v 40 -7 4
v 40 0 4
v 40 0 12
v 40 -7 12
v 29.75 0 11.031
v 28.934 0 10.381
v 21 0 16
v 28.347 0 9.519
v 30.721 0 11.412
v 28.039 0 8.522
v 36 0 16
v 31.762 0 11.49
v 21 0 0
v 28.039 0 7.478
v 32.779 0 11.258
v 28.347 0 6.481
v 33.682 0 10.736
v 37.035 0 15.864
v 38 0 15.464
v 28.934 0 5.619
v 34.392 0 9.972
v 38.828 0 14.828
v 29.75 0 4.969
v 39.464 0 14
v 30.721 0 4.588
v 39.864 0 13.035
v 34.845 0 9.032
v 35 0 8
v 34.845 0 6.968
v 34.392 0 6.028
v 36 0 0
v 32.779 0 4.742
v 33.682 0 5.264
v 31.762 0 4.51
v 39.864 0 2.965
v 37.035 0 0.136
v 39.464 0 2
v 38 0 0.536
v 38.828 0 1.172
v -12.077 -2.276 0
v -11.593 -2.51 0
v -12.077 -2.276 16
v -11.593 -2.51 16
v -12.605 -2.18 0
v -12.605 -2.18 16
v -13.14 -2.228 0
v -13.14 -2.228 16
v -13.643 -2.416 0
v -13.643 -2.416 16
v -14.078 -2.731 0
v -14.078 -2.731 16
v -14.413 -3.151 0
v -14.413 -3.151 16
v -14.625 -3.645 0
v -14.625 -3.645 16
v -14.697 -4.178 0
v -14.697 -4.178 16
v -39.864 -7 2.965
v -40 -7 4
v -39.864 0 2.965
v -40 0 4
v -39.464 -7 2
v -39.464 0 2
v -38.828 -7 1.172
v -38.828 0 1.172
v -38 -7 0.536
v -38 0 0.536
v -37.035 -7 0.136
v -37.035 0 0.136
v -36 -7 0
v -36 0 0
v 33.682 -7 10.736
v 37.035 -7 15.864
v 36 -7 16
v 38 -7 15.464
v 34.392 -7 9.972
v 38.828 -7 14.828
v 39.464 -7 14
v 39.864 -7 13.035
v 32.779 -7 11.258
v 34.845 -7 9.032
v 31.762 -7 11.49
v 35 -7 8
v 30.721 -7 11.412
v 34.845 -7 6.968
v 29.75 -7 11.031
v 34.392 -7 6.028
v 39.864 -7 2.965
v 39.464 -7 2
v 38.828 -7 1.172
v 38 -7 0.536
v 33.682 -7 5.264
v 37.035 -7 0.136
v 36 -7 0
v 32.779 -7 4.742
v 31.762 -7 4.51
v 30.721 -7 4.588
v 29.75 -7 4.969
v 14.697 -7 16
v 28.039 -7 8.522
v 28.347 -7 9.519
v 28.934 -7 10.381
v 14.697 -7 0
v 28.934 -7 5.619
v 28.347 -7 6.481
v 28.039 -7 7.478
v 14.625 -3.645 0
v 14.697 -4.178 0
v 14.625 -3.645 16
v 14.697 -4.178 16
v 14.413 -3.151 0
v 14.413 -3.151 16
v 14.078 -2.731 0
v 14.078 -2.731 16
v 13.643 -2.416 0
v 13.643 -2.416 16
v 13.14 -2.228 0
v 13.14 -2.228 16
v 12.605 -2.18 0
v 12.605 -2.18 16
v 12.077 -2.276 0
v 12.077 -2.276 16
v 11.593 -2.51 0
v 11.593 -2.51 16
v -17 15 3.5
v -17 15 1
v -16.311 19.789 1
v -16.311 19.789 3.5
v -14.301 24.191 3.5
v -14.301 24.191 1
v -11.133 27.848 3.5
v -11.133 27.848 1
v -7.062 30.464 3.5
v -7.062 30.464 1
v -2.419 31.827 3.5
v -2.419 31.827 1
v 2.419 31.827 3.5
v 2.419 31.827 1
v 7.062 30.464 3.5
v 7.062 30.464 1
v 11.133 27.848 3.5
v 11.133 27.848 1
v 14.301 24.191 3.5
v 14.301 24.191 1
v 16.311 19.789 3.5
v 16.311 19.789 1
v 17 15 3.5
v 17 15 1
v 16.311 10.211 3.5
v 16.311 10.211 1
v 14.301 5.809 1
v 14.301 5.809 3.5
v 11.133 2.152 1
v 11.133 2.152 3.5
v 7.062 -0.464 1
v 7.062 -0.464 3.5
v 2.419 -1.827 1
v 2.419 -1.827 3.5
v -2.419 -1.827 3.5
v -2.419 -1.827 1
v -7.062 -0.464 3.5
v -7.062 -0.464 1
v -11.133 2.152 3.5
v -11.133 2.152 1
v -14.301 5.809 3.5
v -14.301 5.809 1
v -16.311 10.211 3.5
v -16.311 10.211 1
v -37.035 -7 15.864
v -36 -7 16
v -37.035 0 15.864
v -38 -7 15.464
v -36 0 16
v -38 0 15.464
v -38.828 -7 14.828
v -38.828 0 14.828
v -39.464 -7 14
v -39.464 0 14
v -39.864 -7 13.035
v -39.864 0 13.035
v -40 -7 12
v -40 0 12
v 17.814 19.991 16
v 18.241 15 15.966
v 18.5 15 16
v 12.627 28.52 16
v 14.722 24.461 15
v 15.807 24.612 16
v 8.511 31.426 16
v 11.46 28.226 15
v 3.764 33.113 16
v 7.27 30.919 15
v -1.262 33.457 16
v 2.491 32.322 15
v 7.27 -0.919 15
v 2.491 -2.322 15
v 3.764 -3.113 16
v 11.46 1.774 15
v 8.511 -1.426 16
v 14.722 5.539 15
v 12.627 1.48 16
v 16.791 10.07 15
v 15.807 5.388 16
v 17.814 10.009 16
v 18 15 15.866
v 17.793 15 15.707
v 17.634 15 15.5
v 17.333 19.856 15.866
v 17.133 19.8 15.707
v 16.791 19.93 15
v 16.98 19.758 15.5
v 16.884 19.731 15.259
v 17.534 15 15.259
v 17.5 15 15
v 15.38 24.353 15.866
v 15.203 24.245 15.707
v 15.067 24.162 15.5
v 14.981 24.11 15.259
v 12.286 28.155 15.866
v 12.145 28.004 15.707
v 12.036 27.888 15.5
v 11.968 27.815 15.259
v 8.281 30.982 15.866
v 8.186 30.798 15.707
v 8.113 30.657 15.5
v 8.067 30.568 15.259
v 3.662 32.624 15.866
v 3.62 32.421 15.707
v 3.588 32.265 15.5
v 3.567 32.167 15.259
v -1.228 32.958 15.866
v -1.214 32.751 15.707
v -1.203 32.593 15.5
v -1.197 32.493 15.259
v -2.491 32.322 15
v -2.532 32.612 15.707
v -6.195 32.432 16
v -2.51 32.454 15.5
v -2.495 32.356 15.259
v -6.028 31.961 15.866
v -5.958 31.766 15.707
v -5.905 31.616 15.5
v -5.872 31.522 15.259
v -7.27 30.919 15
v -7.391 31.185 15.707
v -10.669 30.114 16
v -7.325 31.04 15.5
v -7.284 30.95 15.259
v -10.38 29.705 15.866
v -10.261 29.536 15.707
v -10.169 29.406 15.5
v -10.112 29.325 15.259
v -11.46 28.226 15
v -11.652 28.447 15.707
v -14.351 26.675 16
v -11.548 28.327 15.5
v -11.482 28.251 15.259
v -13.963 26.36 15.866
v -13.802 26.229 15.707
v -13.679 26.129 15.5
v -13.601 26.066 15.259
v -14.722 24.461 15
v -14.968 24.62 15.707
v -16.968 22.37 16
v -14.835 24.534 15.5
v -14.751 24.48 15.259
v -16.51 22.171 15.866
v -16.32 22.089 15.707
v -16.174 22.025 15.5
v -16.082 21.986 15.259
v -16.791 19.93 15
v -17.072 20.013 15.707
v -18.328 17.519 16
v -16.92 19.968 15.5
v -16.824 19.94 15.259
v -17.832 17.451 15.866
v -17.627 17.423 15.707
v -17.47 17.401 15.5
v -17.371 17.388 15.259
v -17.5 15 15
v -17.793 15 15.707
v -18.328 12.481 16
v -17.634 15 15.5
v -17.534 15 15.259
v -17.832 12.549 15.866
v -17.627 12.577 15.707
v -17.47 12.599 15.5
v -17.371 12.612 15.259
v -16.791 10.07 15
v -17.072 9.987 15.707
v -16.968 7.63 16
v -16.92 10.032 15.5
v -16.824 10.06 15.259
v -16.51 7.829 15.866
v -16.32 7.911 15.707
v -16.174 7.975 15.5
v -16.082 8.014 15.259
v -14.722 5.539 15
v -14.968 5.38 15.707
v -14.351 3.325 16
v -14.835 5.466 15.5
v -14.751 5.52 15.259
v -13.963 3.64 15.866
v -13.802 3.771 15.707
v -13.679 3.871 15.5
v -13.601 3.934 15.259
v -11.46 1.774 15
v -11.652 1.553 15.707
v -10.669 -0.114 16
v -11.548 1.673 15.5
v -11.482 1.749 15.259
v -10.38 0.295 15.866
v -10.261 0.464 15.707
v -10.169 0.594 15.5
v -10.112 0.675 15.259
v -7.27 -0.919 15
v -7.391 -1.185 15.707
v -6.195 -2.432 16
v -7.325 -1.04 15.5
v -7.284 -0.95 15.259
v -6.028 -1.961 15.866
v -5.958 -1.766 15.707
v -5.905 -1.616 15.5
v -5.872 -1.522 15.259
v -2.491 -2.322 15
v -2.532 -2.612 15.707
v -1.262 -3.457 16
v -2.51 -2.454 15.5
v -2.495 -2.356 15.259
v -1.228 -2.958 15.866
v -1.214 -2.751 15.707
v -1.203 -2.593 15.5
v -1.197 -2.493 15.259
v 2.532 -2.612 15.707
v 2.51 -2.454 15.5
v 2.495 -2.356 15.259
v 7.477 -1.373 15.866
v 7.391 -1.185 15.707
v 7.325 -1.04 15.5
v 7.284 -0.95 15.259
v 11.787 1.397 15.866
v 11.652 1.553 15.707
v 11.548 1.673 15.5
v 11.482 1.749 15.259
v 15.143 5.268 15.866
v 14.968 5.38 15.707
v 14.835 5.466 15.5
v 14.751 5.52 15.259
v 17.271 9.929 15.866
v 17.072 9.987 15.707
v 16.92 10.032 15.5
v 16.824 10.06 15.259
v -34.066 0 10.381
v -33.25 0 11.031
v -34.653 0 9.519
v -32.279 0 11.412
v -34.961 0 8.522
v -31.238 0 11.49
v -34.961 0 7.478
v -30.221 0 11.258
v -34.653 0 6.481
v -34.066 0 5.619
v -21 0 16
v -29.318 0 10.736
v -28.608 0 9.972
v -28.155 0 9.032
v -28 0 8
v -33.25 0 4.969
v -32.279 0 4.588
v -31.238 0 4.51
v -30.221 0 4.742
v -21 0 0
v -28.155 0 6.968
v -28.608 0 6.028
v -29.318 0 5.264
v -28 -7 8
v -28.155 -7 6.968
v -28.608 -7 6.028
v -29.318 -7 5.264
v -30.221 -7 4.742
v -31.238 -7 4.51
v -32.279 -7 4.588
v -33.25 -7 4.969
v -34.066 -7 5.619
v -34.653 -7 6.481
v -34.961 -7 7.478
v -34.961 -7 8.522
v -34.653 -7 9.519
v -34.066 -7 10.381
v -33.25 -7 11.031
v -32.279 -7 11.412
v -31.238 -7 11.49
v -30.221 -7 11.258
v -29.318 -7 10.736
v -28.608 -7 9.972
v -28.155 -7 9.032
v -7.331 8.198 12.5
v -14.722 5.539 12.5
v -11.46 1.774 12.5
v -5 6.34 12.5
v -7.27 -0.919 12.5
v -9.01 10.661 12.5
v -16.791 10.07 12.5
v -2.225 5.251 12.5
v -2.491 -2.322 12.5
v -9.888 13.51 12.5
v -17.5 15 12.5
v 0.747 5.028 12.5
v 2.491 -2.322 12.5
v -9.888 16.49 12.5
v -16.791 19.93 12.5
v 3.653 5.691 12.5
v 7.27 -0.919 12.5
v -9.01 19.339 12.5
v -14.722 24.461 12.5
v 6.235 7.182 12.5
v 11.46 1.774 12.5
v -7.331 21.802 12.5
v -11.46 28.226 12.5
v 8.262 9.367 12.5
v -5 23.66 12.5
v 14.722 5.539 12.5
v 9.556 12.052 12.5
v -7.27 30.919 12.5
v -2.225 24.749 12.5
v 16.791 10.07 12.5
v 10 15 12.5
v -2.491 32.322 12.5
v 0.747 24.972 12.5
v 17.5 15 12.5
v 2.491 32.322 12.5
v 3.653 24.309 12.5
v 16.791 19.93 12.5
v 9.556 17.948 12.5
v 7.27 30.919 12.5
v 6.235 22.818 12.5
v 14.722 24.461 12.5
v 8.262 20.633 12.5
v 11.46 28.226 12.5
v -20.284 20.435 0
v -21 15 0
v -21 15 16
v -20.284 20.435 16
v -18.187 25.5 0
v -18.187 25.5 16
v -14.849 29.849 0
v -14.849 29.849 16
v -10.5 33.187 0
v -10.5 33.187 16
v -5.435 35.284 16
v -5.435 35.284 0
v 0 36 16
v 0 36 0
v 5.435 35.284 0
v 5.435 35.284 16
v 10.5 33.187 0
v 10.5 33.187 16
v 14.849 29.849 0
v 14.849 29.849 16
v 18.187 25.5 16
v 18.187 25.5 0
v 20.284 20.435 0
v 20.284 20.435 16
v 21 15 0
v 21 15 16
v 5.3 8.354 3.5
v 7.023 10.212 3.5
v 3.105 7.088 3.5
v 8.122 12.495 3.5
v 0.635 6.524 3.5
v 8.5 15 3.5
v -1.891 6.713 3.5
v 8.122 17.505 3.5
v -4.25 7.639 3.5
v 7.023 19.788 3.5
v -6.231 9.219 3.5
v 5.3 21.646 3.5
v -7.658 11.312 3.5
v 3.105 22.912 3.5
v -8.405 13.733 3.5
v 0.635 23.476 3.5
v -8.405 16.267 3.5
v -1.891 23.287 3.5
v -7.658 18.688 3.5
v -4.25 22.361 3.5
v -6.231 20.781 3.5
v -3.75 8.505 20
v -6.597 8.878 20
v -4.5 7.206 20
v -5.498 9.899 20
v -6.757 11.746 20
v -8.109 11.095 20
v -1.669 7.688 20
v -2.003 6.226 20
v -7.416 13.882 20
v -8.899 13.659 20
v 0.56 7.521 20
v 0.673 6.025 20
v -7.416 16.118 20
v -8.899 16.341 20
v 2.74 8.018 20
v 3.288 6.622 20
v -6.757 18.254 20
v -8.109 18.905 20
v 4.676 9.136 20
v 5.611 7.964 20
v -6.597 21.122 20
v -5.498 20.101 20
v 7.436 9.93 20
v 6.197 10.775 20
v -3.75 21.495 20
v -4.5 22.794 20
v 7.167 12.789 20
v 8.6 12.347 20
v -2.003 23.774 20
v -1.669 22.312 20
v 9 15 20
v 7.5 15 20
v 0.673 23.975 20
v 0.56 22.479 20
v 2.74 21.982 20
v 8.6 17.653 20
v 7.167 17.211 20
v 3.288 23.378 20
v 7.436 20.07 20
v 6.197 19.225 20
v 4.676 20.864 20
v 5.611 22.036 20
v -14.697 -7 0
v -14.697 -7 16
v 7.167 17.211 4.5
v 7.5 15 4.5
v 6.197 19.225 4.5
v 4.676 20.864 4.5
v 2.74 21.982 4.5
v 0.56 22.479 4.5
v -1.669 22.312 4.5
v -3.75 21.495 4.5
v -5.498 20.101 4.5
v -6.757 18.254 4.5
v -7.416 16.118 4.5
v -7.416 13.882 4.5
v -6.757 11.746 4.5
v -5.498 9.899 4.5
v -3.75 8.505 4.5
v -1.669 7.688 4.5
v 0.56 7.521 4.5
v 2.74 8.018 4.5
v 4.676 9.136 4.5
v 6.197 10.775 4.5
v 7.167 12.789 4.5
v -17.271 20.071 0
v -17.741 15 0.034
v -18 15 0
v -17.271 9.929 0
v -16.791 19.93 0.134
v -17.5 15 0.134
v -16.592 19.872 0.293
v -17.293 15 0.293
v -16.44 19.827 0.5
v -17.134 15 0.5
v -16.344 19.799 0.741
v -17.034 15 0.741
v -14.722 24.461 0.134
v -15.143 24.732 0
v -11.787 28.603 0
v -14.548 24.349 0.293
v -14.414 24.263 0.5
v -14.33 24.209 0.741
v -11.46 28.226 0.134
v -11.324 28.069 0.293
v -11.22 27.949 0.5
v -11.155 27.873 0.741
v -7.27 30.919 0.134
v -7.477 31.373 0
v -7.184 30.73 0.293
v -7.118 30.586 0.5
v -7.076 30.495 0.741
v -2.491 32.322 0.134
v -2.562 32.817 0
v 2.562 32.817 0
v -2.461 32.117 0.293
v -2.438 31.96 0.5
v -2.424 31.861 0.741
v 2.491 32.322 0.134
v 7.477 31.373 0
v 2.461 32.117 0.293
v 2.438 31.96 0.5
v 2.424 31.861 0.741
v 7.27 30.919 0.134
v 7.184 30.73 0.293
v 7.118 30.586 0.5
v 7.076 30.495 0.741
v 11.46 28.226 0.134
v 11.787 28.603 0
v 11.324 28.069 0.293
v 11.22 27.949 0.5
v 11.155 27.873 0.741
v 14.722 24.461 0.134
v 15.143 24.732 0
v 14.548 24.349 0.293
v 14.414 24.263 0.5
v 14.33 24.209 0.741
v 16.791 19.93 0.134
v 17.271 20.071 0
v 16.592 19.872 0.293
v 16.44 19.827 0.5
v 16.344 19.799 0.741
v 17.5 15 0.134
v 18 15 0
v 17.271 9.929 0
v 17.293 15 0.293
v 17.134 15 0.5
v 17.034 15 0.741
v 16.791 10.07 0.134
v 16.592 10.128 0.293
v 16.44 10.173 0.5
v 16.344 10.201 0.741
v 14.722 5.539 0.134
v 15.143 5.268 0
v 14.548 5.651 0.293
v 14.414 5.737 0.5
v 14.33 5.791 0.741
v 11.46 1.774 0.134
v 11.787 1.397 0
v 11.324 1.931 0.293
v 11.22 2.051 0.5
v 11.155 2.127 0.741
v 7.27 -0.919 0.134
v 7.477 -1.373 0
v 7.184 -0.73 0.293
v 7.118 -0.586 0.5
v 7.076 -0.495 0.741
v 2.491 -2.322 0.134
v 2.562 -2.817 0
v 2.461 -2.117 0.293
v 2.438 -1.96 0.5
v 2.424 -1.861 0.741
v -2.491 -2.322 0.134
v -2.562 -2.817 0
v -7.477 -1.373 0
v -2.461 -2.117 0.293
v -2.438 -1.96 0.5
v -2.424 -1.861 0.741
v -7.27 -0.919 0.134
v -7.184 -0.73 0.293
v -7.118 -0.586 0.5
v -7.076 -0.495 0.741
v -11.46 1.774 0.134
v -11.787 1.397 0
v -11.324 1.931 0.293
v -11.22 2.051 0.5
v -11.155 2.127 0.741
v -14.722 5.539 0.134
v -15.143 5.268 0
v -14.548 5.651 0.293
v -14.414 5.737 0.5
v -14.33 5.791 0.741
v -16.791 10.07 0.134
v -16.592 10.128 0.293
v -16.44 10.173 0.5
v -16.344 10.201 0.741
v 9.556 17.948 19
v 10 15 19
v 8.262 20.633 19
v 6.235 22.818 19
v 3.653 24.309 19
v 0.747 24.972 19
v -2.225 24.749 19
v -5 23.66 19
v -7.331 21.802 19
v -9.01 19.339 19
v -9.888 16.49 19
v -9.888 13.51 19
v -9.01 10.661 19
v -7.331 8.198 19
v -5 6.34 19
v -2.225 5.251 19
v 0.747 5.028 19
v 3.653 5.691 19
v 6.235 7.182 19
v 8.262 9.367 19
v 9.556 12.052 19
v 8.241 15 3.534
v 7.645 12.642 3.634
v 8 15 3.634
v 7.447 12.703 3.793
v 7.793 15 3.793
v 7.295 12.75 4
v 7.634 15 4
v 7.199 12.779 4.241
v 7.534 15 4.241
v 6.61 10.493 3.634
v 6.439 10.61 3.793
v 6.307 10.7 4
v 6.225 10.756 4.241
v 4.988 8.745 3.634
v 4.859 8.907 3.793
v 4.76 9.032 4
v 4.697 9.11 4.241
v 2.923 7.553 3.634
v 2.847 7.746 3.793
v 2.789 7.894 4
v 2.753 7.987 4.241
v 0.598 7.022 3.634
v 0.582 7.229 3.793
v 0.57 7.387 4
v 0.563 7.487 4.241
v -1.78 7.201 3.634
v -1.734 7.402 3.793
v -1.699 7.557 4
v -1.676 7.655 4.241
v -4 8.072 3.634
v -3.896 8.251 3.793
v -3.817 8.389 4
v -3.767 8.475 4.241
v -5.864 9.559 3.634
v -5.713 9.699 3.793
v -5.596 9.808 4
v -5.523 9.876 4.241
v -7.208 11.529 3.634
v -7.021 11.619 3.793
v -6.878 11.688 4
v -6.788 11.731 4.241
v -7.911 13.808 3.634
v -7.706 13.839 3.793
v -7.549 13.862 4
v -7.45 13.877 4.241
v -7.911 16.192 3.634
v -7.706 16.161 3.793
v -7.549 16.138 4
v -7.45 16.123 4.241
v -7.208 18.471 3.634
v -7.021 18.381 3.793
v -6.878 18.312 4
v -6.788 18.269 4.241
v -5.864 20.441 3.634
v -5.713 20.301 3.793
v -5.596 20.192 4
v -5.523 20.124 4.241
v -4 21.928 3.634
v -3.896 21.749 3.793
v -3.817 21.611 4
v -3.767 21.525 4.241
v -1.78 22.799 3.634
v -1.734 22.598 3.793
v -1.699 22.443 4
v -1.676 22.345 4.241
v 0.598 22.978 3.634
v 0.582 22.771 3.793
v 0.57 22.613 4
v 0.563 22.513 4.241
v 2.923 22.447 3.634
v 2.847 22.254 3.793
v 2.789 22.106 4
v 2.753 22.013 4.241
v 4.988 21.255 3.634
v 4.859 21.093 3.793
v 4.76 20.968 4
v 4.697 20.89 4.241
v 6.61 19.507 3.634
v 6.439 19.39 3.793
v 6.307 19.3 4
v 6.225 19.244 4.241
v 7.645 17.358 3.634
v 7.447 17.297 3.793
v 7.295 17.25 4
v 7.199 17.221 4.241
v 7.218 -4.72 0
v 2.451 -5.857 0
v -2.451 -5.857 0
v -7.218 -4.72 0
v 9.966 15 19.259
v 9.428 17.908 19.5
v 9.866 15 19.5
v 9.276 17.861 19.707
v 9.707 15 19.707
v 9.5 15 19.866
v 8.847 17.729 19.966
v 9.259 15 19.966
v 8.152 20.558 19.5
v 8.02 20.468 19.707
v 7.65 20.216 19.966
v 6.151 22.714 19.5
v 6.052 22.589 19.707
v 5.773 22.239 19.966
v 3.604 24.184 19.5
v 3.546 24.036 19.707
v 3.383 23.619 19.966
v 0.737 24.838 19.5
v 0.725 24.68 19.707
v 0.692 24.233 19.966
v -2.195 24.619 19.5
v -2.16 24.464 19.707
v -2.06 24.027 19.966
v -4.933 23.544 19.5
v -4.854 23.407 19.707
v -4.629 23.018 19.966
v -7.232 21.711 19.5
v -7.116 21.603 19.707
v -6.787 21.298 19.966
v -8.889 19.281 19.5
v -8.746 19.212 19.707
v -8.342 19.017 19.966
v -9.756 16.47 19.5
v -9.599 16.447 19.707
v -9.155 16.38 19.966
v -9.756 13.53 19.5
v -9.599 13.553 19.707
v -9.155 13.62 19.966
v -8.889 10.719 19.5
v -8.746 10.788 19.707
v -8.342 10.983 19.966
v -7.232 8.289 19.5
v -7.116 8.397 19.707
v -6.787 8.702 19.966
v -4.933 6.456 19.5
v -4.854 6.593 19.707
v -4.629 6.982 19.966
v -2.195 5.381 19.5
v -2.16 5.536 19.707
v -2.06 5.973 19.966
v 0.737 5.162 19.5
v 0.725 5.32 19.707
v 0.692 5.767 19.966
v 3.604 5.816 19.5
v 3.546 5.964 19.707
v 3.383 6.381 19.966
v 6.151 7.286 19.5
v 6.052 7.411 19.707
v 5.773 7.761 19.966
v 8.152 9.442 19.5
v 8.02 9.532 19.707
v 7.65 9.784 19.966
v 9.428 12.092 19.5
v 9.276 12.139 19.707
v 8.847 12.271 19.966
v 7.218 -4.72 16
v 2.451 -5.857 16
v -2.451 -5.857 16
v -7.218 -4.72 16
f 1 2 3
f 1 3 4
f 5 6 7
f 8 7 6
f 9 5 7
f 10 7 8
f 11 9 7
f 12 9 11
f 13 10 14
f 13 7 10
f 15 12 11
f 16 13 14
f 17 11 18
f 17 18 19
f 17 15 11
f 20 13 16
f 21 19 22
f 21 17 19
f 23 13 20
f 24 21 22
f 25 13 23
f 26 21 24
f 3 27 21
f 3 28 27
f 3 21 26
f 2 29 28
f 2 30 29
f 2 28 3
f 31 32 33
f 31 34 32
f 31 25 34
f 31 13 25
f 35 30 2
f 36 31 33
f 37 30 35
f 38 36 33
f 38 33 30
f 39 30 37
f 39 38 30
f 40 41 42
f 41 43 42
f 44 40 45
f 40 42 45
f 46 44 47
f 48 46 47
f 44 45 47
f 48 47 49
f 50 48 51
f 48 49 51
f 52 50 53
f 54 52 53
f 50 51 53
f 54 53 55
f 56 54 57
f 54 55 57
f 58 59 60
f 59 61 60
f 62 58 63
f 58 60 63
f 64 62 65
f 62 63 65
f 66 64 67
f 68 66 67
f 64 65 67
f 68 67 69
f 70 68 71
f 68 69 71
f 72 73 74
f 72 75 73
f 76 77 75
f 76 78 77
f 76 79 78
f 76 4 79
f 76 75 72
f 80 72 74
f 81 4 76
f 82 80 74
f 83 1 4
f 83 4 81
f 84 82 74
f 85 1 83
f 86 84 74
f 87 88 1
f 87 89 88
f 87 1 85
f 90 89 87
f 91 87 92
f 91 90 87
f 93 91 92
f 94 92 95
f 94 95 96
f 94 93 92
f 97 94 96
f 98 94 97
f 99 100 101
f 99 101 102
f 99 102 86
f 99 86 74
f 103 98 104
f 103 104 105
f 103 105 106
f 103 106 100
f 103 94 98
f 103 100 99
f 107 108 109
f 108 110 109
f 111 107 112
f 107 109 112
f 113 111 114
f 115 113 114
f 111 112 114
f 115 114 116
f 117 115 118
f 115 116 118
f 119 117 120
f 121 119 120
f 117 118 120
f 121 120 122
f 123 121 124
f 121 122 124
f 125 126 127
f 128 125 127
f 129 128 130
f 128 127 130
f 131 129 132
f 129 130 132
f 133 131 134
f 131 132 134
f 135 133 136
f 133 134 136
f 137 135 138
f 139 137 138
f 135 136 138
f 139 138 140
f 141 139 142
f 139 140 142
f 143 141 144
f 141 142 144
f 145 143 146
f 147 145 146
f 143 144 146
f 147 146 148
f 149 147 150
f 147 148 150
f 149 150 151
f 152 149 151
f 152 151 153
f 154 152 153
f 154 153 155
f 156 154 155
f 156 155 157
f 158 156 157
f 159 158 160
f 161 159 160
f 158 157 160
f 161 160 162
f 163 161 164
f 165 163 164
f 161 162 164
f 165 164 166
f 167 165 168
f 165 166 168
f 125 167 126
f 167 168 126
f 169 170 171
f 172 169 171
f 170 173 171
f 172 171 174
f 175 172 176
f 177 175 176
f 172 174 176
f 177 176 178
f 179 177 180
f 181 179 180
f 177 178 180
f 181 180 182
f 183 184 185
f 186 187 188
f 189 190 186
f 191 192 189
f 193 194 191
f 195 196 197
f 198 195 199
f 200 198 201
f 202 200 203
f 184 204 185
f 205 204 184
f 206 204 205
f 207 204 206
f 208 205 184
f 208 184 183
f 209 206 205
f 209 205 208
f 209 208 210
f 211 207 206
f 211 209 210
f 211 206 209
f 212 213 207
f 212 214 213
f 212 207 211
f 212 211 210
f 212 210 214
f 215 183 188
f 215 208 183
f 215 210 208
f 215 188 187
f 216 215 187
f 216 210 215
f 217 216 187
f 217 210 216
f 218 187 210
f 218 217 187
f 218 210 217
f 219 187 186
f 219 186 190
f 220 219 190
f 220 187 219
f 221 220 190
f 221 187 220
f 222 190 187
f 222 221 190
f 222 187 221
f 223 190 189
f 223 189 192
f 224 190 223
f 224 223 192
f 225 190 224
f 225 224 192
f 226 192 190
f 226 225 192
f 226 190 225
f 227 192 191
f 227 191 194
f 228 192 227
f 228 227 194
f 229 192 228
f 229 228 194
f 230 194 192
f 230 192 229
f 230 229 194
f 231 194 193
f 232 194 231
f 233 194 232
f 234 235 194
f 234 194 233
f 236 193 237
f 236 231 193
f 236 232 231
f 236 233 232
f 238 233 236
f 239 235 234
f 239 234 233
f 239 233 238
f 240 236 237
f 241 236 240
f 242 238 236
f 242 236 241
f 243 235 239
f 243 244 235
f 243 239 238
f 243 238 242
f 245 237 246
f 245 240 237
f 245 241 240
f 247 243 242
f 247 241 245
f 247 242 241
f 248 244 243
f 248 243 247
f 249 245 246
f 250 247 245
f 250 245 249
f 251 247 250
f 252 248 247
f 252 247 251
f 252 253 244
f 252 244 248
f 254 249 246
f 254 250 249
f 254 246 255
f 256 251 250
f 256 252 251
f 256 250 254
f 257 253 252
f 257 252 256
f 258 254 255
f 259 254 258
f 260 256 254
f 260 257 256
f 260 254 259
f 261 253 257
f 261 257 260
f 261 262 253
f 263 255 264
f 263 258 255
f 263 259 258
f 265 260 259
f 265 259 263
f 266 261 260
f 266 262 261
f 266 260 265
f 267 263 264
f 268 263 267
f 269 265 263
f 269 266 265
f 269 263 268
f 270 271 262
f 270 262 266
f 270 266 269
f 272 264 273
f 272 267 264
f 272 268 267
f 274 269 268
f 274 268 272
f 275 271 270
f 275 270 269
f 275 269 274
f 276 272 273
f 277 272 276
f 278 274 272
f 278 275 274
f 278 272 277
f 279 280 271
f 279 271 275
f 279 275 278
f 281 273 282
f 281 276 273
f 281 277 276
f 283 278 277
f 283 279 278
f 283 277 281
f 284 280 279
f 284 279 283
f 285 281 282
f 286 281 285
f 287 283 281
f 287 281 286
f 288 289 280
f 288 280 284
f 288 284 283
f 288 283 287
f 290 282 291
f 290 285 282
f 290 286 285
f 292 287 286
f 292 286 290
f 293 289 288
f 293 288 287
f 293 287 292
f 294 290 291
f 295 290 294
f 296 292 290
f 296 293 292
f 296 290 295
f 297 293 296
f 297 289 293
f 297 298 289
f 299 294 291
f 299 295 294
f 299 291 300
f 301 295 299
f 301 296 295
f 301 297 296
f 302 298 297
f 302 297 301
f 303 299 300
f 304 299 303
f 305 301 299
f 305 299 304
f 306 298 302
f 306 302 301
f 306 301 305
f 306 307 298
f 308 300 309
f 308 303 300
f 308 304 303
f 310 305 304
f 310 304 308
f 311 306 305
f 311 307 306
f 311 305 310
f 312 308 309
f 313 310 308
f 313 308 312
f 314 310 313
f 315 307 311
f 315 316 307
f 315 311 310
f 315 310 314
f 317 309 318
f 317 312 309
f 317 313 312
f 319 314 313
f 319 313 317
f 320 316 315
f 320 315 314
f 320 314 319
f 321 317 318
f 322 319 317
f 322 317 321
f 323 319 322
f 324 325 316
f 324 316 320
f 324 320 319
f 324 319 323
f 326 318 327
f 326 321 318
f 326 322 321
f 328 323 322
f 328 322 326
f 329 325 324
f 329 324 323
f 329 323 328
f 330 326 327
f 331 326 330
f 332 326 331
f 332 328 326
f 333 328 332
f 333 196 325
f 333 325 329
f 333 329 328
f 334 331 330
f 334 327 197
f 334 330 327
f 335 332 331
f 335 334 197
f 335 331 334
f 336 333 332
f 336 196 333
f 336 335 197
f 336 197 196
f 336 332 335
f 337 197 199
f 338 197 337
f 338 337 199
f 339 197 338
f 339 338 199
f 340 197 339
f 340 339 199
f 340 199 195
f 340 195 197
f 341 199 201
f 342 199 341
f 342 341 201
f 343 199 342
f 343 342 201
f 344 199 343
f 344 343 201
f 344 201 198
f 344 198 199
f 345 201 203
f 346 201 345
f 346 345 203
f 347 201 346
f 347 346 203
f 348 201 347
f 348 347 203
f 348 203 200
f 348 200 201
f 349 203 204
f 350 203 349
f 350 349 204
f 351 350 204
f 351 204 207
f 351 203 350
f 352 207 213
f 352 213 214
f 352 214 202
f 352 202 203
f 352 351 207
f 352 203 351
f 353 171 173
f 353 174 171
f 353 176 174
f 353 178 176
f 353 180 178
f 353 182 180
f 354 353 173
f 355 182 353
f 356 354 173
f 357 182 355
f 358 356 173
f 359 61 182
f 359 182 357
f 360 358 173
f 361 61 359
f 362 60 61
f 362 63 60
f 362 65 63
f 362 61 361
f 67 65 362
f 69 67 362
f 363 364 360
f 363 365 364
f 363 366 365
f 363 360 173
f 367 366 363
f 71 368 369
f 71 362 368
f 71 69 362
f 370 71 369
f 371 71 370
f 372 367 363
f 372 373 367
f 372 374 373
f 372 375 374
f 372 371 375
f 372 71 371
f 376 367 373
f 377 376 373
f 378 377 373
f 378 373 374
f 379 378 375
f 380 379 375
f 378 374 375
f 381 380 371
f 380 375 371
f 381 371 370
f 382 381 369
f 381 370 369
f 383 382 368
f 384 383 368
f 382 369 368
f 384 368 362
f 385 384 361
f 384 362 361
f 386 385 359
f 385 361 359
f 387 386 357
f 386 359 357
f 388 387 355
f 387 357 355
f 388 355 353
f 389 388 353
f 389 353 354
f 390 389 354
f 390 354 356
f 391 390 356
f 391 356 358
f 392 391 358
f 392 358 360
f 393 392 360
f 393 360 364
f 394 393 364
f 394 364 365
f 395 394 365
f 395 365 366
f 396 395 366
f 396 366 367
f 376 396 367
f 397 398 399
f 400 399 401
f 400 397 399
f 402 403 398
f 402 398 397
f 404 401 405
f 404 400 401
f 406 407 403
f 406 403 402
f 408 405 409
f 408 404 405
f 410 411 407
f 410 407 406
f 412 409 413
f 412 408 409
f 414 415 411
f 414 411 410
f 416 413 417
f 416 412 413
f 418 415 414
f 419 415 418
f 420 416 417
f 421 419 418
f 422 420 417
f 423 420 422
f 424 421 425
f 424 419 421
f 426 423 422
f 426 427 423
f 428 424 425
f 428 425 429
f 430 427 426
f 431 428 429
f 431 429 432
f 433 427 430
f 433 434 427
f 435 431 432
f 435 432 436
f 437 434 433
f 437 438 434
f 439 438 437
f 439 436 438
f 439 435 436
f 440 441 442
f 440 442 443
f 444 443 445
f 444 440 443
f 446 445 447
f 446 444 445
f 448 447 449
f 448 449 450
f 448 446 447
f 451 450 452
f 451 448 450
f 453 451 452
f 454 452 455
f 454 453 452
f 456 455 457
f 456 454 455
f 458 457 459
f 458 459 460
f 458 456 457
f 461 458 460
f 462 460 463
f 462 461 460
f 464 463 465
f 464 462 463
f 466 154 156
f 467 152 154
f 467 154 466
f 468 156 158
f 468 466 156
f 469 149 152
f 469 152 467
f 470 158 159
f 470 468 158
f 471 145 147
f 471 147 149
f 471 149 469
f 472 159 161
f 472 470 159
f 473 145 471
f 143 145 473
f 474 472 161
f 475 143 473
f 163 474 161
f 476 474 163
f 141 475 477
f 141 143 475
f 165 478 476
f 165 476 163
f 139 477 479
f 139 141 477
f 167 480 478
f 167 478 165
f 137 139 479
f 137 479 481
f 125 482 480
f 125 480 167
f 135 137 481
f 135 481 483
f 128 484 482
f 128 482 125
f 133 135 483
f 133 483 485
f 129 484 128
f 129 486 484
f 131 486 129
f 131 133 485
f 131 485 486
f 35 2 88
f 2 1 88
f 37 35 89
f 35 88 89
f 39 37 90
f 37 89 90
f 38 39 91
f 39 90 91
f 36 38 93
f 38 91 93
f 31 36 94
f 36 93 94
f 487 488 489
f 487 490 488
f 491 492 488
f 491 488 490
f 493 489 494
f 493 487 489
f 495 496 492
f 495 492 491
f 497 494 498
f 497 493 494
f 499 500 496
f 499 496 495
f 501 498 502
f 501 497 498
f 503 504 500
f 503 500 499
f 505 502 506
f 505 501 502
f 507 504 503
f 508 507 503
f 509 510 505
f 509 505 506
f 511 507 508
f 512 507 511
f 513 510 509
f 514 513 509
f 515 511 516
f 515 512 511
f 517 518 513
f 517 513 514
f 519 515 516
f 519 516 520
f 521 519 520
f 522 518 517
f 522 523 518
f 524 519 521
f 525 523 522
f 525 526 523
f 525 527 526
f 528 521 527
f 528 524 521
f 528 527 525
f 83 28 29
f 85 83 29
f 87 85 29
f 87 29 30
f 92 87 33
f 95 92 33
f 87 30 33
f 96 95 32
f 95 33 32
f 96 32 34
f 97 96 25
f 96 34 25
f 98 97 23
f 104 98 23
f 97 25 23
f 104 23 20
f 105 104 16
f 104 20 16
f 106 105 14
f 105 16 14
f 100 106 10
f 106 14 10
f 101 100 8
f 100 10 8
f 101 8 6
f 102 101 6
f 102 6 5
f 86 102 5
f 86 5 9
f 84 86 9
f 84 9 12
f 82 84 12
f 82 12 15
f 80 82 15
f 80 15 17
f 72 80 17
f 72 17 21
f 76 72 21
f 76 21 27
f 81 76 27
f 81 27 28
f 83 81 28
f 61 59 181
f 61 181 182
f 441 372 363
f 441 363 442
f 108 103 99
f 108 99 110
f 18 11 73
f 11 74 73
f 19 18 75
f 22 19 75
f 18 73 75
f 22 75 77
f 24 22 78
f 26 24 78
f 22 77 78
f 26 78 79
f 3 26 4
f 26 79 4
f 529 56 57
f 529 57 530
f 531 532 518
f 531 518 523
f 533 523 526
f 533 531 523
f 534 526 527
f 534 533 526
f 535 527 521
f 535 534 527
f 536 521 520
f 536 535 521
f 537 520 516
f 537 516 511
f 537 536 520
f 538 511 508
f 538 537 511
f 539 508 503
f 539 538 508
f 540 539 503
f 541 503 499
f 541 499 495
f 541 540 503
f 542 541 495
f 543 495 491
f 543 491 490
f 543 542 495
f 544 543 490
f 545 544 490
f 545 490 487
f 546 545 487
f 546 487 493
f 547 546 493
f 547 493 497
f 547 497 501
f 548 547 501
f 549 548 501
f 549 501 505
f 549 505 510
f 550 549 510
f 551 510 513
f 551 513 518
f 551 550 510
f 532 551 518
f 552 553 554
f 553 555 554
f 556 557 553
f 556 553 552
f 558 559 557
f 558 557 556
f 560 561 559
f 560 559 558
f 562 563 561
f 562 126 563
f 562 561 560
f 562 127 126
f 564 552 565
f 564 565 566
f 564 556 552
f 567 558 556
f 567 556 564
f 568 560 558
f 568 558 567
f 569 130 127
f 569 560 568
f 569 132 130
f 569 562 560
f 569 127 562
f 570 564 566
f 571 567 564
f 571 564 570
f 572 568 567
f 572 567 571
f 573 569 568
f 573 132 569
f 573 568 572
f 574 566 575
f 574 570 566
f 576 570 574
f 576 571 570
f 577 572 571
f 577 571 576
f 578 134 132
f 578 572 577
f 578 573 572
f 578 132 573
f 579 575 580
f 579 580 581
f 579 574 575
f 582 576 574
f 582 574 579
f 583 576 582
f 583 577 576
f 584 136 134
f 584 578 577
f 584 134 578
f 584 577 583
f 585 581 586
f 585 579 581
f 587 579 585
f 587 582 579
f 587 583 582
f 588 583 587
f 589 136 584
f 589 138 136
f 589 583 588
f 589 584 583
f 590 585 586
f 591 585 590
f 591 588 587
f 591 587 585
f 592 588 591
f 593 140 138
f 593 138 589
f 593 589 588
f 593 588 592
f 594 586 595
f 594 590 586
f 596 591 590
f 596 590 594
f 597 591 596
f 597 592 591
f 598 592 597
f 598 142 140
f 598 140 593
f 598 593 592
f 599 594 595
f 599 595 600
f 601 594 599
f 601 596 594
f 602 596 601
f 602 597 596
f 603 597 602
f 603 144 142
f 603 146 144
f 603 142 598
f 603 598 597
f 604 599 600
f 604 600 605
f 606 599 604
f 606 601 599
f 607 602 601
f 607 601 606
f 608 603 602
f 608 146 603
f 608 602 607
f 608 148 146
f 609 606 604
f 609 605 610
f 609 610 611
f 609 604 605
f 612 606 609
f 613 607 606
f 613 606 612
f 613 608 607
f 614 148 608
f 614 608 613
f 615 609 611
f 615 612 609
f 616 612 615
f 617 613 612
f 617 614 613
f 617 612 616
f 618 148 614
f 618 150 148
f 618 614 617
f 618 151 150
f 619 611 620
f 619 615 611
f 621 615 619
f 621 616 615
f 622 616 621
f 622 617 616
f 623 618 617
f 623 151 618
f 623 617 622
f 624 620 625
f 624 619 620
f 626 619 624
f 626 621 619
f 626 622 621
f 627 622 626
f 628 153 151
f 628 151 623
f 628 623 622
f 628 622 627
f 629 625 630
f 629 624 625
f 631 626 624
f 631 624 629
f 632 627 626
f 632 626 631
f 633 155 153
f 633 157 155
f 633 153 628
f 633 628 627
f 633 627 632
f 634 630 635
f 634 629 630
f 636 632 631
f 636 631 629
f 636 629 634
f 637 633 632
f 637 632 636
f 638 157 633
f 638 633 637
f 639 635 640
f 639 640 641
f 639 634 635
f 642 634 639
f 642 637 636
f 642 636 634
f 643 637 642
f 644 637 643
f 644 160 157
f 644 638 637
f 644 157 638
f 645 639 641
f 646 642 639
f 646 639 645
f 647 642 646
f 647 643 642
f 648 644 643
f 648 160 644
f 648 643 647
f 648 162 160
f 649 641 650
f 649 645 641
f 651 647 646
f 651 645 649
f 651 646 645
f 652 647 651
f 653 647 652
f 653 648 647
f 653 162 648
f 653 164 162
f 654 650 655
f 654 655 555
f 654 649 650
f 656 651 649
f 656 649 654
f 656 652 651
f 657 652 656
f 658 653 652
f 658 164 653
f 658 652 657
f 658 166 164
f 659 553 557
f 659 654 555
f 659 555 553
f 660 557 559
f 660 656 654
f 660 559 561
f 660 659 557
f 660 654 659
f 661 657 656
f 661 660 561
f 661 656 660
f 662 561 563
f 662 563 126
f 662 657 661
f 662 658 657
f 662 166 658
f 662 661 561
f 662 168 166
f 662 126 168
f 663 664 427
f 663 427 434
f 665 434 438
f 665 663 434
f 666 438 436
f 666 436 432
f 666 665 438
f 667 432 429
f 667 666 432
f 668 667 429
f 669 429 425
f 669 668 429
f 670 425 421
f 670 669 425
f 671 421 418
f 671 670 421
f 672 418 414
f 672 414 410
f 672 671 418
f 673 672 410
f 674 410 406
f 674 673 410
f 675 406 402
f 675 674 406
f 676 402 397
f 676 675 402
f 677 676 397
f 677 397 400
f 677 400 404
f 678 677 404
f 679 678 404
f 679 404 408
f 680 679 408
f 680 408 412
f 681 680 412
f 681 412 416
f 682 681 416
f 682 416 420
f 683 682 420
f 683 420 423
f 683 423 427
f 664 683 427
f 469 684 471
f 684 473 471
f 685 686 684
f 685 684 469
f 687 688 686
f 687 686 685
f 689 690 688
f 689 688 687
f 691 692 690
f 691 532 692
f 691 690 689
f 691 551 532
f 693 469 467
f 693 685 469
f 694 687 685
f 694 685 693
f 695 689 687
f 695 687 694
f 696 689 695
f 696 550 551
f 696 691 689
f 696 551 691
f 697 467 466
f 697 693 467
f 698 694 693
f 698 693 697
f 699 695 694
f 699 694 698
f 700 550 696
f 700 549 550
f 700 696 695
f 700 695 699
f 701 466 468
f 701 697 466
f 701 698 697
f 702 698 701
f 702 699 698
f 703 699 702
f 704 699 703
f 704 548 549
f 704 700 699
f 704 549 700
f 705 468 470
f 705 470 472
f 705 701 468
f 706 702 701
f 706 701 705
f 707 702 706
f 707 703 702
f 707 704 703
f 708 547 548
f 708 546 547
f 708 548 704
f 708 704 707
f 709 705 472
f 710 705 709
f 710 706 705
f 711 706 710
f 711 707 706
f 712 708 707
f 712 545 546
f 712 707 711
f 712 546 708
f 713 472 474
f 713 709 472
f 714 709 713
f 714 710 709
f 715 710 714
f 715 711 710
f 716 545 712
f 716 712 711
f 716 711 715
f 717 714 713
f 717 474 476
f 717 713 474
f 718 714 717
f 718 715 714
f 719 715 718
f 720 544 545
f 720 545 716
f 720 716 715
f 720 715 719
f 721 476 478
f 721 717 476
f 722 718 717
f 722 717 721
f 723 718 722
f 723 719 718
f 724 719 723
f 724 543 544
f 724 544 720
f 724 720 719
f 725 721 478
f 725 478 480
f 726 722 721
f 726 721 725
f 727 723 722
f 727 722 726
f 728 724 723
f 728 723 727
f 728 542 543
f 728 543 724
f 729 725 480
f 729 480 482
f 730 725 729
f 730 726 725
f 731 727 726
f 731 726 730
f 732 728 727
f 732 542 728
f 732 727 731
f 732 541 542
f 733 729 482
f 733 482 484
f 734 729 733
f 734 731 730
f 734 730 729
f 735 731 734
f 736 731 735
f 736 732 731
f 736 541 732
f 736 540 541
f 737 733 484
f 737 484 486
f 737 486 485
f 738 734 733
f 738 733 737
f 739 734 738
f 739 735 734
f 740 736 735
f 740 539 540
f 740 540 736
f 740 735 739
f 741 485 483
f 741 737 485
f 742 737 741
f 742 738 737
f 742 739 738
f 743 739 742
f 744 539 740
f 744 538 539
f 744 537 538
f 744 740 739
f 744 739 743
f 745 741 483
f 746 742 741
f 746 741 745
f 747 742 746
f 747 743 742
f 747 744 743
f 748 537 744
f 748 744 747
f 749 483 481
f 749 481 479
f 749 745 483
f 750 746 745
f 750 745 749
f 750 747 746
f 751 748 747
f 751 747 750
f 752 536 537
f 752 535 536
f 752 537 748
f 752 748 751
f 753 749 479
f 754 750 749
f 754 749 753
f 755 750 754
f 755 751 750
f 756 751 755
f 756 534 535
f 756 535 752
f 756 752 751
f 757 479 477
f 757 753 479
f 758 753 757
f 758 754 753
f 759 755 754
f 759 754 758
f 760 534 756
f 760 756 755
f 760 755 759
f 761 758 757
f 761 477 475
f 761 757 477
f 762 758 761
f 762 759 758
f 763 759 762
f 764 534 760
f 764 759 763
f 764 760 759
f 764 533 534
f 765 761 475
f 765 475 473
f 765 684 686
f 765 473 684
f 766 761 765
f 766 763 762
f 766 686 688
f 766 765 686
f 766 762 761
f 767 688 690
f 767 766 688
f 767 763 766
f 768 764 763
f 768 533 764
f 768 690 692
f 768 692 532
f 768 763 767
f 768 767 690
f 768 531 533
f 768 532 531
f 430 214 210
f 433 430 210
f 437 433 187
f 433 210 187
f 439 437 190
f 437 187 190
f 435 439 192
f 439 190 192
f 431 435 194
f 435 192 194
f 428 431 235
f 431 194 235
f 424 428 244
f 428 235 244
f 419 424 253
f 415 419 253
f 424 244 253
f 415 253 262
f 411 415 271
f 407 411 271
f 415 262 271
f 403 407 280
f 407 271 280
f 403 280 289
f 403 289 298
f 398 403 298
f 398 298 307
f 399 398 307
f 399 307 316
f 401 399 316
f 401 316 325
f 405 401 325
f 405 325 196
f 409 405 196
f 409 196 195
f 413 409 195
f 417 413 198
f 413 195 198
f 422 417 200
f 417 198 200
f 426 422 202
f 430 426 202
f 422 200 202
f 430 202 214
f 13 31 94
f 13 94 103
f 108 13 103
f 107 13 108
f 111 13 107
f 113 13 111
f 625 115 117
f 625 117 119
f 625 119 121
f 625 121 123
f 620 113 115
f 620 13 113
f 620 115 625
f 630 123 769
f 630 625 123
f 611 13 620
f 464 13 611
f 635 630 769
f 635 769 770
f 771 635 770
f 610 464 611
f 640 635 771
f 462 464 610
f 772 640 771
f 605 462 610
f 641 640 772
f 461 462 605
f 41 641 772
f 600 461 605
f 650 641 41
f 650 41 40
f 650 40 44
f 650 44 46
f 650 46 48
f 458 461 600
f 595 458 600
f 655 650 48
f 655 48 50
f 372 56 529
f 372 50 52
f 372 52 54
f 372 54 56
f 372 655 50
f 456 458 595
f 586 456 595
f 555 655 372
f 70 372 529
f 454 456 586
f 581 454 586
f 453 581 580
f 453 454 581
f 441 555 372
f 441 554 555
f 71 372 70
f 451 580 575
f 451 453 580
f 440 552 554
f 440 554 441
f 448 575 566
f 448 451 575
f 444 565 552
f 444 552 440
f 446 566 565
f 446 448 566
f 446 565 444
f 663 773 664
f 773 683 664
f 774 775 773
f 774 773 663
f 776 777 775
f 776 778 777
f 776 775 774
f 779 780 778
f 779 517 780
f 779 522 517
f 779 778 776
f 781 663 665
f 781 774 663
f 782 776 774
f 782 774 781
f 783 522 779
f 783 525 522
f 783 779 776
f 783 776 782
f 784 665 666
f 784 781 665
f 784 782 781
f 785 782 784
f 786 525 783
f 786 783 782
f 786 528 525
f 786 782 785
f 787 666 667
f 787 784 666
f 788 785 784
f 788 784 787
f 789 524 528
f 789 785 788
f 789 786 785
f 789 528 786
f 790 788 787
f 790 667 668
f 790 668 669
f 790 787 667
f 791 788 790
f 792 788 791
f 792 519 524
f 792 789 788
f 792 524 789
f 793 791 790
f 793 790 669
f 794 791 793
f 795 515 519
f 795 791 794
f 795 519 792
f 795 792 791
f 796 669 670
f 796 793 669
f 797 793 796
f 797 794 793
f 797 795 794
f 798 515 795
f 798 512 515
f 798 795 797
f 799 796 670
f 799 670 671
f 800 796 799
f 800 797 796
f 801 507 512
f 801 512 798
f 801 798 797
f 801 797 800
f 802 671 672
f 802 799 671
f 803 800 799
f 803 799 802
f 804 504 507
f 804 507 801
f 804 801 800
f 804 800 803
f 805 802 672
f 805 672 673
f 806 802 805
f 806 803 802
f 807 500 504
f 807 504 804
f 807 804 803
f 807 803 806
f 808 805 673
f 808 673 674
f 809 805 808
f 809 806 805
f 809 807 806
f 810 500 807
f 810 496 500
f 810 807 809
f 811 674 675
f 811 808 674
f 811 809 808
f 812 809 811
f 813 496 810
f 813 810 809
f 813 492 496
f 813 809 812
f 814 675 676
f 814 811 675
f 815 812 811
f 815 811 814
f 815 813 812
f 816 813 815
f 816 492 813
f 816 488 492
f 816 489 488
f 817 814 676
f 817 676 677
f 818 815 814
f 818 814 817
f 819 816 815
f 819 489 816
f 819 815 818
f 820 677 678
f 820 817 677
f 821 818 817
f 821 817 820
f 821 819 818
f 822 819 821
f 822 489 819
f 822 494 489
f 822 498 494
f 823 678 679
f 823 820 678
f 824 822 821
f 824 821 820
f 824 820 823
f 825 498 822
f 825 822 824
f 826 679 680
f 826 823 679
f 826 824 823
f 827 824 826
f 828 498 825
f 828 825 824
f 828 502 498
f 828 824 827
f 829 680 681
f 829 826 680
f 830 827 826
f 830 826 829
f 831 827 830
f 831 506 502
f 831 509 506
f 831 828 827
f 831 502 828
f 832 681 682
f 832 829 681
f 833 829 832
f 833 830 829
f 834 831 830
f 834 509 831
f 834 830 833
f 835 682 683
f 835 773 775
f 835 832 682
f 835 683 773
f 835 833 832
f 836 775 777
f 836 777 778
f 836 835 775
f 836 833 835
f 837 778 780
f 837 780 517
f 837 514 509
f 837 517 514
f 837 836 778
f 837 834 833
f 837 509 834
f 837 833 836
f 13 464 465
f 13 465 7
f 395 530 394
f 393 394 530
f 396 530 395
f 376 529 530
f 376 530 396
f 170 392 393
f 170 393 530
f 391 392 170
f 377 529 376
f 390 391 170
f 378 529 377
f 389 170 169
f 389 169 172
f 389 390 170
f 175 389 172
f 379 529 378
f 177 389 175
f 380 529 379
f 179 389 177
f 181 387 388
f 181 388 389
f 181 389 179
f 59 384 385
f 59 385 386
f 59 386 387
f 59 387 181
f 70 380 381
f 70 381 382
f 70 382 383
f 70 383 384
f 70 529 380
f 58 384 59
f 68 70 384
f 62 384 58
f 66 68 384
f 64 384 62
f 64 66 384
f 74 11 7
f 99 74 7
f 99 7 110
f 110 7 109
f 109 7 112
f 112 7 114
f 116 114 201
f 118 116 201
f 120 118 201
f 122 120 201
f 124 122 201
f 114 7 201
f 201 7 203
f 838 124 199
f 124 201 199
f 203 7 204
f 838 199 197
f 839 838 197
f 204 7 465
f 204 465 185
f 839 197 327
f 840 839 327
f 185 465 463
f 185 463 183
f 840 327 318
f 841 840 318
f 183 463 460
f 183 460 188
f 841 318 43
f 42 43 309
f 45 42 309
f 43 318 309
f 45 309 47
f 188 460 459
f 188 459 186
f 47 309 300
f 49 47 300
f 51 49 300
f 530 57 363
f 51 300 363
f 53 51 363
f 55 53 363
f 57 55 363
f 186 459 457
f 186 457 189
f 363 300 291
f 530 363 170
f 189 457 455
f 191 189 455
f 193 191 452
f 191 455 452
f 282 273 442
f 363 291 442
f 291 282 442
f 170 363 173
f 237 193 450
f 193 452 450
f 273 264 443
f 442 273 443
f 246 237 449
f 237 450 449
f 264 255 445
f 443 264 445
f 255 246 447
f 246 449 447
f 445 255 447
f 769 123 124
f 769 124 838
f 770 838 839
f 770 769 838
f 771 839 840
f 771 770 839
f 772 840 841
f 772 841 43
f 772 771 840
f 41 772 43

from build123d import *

# Parameters (mm, degrees)
SKETCH_1_R               = 7.5
EXTRUDE_1_DEPTH          = 16
SKETCH_2_R               = 10
SKETCH_2_R_2             = 7.5
EXTRUDE_2_DEPTH          = 4
SKETCH_3_R               = 17.5
SKETCH_3_R_2             = 10
CUT_EXTRUDE_1_DEPTH      = 3.5
SKETCH_4_R               = 17
CUT_EXTRUDE_2_DEPTH      = 3.5
FILLET_1_R               = 4
FILLET_2_R               = 2
FILLET_3_R               = 1
SKETCH_5_R               = 3.5
CUT_EXTRUDE_3_DEPTH      = 37
CUT_EXTRUDE_3_DEPTH_BACK = 8


with BuildPart() as part:
    # 草图1 → 凸台-拉伸1 (new body)
    with BuildSketch(Plane.XY):
        with BuildLine():
            Line((-40, 0), (-21, 0))
            Line((-21, 0), (-21, 15))
            ThreePointArc((-21, 15), (0, 36), (21, 15))
            Line((21, 15), (21, 0))
            Line((21, 0), (40, 0))
            Line((40, 0), (40, -7))
            Line((40, -7), (14.696938457, -7))
            Line((14.696938457, -7), (14.696938457, 0))
            ThreePointArc((14.696938457, 0), (0, -6), (-14.696938457, 0))
            Line((-14.696938457, 0), (-14.696938457, -7))
            Line((-14.696938457, -7), (-40, -7))
            Line((-40, -7), (-40, 0))
        make_face()
        with Locations((0, 15)):
            Circle(SKETCH_1_R, mode=Mode.SUBTRACT)
    extrude(amount=EXTRUDE_1_DEPTH)

    # 草图2 → 凸台-拉伸2 (add)
    with BuildSketch(Plane.XY.offset(16)):
        with Locations((0, 15)):
            Circle(SKETCH_2_R)
        with Locations((0, 15)):
            Circle(SKETCH_2_R_2, mode=Mode.SUBTRACT)
    extrude(amount=EXTRUDE_2_DEPTH)

    # 草图3 → 切除-拉伸1 (cut)
    with BuildSketch(Plane.XY.offset(16)):
        with Locations((0, 15)):
            Circle(SKETCH_3_R)
        with Locations((0, 15)):
            Circle(SKETCH_3_R_2, mode=Mode.SUBTRACT)
    extrude(amount=-CUT_EXTRUDE_1_DEPTH, mode=Mode.SUBTRACT)

    # 草图4 → 切除-拉伸2 (cut)
    with BuildSketch(Plane(origin=(0, 0, 0), x_dir=(-1, 0, 0), z_dir=(0, 0, -1))):
        with Locations((0, 15)):
            Circle(SKETCH_4_R)
    extrude(amount=-CUT_EXTRUDE_2_DEPTH, mode=Mode.SUBTRACT)

    # 圆角1
    fillet_1_edges = [part.edges().sort_by_distance(p)[0] for p in [
        (40, -3.5, 0),
        (-40, -3.5, 0),
        (40, -3.5, 16),
        (-40, -3.5, 16),
    ]]
    fillet(fillet_1_edges, radius=FILLET_1_R)

    # 圆角2
    fillet_2_edges = [part.edges().sort_by_distance(p)[0] for p in [
        (14.696938457, 0, 8),
        (-14.696938457, 0, 8),
    ]]
    fillet(fillet_2_edges, radius=FILLET_2_R)

    # 圆角3
    fillet_3_edges = [part.edges().sort_by_distance(p)[0] for p in [
        (-10, 15, 20),
        (-17.5, 15, 16),
        (-7.5, 15, 3.5),
        (17, 15, 0),
    ]]
    fillet(fillet_3_edges, radius=FILLET_3_R)

    # 草图5 → 切除-拉伸3 (cut, two sides)
    with BuildSketch(Plane(origin=(0, 0, 0), x_dir=(1, 0, 0), z_dir=(0, 1, 0))) as cut_extrude_3_sk:
        with Locations((-31.5, -8)):
            Circle(SKETCH_5_R)
        with Locations((31.5, -8)):
            Circle(SKETCH_5_R)
    extrude(amount=CUT_EXTRUDE_3_DEPTH, mode=Mode.SUBTRACT)
    extrude(cut_extrude_3_sk.sketch, amount=-CUT_EXTRUDE_3_DEPTH_BACK, mode=Mode.SUBTRACT)


solid = part.part
